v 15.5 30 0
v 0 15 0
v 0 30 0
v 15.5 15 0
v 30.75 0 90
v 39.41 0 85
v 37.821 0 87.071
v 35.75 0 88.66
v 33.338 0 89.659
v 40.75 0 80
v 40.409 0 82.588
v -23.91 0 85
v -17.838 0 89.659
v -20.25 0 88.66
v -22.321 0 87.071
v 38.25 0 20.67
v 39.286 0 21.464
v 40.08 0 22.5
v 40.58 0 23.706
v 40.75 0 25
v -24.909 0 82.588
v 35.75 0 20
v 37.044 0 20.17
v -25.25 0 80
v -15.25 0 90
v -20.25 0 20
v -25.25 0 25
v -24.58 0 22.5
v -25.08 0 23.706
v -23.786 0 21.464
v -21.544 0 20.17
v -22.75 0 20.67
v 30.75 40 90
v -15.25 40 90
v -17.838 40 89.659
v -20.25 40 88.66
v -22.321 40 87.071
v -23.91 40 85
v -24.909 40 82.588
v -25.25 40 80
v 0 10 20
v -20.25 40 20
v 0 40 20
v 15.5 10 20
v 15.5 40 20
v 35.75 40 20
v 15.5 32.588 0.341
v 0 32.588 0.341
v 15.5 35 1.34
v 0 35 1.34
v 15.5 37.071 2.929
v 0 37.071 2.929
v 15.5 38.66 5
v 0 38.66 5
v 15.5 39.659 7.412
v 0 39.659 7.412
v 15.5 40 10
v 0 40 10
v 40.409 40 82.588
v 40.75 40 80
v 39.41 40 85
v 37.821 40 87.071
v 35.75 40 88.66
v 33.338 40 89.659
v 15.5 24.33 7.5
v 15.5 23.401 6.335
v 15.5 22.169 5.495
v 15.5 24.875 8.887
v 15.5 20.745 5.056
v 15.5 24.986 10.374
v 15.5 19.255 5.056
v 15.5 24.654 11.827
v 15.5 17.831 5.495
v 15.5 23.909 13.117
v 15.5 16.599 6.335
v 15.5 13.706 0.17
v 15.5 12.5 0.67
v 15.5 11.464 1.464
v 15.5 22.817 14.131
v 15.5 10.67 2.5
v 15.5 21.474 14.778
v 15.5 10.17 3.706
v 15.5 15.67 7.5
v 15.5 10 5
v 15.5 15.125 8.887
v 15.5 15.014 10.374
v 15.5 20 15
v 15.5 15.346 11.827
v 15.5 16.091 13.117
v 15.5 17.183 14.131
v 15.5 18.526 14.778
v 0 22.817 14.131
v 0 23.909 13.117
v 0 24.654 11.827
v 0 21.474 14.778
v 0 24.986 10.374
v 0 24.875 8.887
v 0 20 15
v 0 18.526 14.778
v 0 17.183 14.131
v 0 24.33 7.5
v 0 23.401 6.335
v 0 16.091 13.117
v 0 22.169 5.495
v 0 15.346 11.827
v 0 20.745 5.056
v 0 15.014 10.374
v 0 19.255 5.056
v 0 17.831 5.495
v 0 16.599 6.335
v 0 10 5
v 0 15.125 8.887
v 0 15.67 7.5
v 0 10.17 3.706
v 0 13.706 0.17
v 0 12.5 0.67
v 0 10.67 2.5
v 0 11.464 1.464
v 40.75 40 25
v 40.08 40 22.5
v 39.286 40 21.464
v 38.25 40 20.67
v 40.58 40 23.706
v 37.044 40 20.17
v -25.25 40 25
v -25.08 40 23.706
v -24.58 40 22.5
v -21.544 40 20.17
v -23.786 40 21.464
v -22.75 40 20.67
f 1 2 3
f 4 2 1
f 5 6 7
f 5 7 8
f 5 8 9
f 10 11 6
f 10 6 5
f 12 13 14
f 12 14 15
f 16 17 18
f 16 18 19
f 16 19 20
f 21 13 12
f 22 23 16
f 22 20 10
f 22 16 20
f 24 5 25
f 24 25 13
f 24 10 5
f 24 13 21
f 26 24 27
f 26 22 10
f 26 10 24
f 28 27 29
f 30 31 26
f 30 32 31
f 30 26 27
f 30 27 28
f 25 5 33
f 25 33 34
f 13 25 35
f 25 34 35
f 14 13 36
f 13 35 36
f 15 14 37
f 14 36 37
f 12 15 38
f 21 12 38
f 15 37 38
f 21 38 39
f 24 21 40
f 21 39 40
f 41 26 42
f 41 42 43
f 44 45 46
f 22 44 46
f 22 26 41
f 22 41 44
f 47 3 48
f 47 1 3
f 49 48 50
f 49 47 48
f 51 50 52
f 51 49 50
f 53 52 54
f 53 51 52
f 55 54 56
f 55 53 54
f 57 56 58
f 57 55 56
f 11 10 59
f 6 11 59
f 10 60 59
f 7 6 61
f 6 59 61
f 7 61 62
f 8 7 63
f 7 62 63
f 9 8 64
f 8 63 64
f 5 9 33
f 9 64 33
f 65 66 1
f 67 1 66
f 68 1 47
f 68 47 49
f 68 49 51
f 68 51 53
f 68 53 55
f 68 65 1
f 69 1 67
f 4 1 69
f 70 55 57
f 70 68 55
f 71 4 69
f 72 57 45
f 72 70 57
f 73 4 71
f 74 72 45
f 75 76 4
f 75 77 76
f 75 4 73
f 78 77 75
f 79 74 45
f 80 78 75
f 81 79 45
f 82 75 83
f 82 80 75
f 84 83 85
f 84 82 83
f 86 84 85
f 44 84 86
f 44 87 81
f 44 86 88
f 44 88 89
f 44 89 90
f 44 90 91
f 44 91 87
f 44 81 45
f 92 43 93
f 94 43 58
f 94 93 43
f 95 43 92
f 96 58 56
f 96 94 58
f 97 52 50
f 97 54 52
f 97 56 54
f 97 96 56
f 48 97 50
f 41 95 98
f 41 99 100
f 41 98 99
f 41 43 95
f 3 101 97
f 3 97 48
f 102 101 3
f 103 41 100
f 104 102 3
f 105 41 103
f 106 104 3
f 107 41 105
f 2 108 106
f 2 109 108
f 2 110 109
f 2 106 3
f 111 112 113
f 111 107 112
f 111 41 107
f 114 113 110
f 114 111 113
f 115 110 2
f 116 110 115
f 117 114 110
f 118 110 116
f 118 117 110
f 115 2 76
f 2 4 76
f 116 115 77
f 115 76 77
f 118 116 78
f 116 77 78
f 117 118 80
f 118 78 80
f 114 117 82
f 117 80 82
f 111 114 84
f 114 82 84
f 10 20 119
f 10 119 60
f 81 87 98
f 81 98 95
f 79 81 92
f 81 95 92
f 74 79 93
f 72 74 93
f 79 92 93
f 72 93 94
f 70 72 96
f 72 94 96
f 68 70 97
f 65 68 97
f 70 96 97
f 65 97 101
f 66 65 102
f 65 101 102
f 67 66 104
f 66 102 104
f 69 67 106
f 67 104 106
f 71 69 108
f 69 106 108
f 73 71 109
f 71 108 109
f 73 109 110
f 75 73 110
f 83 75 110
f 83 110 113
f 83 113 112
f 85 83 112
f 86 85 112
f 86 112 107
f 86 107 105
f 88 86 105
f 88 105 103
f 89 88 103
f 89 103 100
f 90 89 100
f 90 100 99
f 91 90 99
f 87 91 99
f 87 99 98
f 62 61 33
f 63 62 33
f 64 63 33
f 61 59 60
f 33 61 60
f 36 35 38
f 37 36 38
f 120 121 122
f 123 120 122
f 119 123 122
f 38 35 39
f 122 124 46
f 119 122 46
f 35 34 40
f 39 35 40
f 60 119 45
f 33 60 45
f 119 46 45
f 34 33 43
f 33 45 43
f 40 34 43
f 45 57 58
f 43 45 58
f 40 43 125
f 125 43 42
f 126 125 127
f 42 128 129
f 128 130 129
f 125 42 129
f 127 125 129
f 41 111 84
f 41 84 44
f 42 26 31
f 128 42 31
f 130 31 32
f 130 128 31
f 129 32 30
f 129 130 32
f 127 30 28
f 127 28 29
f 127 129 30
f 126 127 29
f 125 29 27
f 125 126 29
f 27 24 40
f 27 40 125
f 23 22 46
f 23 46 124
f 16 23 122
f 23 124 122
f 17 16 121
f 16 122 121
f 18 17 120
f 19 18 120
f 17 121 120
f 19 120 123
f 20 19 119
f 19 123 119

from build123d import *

# Parameters (mm, degrees)
BOSS_EXTRUDE2_DEPTH = 40
FILLET1_R           = 10
FILLET2_R           = 10
FILLET3_R           = 10
SKETCH3_W           = 20
SKETCH3_H           = 10
CUT_EXTRUDE2_DEPTH  = 40
FILLET4_R           = 5
FILLET5_R           = 5
FILLET6_R           = 5
SKETCH2_R           = 5
CUT_EXTRUDE3_DEPTH  = 28


with BuildPart() as part:
    # Sketch1 → Boss-Extrude2 (new body)
    with BuildSketch(Plane(origin=(0, 0, 0), x_dir=(1, 0, 0), z_dir=(0, 1, 0))):
        Polygon((0, 0), (15.5, 0), (15.5, -20), (40.75, -20), (40.75, -90), (-25.25, -90), (-25.25, -20), (0, -20), align=None)
    extrude(amount=BOSS_EXTRUDE2_DEPTH)

    # Fillet1
    fillet1_edges = [part.edges().sort_by_distance(p)[0] for p in [
        (7.75, 40, 0),
    ]]
    fillet(fillet1_edges, radius=FILLET1_R)

    # Fillet2
    fillet2_edges = [part.edges().sort_by_distance(p)[0] for p in [
        (40.75, 20, 90),
    ]]
    fillet(fillet2_edges, radius=FILLET2_R)

    # Fillet3
    fillet3_edges = [part.edges().sort_by_distance(p)[0] for p in [
        (-25.25, 20, 90),
    ]]
    fillet(fillet3_edges, radius=FILLET3_R)

    # Sketch3 → Cut-Extrude2 (cut)
    with BuildSketch(Plane.ZY):
        with Locations((10, 5)):
            Rectangle(SKETCH3_W, SKETCH3_H)
    extrude(amount=-CUT_EXTRUDE2_DEPTH, mode=Mode.SUBTRACT)

    # Fillet4
    fillet4_edges = [part.edges().sort_by_distance(p)[0] for p in [
        (7.75, 10, 0),
    ]]
    fillet(fillet4_edges, radius=FILLET4_R)

    # Fillet5
    fillet5_edges = [part.edges().sort_by_distance(p)[0] for p in [
        (-25.25, 20, 20),
    ]]
    fillet(fillet5_edges, radius=FILLET5_R)

    # Fillet6
    fillet6_edges = [part.edges().sort_by_distance(p)[0] for p in [
        (40.75, 20, 20),
    ]]
    fillet(fillet6_edges, radius=FILLET6_R)

    # Sketch2 → Cut-Extrude3 (cut)
    with BuildSketch(Plane.ZY):
        with Locations((10, 20)):
            Circle(SKETCH2_R)
    extrude(amount=-CUT_EXTRUDE3_DEPTH, mode=Mode.SUBTRACT)


solid = part.part
